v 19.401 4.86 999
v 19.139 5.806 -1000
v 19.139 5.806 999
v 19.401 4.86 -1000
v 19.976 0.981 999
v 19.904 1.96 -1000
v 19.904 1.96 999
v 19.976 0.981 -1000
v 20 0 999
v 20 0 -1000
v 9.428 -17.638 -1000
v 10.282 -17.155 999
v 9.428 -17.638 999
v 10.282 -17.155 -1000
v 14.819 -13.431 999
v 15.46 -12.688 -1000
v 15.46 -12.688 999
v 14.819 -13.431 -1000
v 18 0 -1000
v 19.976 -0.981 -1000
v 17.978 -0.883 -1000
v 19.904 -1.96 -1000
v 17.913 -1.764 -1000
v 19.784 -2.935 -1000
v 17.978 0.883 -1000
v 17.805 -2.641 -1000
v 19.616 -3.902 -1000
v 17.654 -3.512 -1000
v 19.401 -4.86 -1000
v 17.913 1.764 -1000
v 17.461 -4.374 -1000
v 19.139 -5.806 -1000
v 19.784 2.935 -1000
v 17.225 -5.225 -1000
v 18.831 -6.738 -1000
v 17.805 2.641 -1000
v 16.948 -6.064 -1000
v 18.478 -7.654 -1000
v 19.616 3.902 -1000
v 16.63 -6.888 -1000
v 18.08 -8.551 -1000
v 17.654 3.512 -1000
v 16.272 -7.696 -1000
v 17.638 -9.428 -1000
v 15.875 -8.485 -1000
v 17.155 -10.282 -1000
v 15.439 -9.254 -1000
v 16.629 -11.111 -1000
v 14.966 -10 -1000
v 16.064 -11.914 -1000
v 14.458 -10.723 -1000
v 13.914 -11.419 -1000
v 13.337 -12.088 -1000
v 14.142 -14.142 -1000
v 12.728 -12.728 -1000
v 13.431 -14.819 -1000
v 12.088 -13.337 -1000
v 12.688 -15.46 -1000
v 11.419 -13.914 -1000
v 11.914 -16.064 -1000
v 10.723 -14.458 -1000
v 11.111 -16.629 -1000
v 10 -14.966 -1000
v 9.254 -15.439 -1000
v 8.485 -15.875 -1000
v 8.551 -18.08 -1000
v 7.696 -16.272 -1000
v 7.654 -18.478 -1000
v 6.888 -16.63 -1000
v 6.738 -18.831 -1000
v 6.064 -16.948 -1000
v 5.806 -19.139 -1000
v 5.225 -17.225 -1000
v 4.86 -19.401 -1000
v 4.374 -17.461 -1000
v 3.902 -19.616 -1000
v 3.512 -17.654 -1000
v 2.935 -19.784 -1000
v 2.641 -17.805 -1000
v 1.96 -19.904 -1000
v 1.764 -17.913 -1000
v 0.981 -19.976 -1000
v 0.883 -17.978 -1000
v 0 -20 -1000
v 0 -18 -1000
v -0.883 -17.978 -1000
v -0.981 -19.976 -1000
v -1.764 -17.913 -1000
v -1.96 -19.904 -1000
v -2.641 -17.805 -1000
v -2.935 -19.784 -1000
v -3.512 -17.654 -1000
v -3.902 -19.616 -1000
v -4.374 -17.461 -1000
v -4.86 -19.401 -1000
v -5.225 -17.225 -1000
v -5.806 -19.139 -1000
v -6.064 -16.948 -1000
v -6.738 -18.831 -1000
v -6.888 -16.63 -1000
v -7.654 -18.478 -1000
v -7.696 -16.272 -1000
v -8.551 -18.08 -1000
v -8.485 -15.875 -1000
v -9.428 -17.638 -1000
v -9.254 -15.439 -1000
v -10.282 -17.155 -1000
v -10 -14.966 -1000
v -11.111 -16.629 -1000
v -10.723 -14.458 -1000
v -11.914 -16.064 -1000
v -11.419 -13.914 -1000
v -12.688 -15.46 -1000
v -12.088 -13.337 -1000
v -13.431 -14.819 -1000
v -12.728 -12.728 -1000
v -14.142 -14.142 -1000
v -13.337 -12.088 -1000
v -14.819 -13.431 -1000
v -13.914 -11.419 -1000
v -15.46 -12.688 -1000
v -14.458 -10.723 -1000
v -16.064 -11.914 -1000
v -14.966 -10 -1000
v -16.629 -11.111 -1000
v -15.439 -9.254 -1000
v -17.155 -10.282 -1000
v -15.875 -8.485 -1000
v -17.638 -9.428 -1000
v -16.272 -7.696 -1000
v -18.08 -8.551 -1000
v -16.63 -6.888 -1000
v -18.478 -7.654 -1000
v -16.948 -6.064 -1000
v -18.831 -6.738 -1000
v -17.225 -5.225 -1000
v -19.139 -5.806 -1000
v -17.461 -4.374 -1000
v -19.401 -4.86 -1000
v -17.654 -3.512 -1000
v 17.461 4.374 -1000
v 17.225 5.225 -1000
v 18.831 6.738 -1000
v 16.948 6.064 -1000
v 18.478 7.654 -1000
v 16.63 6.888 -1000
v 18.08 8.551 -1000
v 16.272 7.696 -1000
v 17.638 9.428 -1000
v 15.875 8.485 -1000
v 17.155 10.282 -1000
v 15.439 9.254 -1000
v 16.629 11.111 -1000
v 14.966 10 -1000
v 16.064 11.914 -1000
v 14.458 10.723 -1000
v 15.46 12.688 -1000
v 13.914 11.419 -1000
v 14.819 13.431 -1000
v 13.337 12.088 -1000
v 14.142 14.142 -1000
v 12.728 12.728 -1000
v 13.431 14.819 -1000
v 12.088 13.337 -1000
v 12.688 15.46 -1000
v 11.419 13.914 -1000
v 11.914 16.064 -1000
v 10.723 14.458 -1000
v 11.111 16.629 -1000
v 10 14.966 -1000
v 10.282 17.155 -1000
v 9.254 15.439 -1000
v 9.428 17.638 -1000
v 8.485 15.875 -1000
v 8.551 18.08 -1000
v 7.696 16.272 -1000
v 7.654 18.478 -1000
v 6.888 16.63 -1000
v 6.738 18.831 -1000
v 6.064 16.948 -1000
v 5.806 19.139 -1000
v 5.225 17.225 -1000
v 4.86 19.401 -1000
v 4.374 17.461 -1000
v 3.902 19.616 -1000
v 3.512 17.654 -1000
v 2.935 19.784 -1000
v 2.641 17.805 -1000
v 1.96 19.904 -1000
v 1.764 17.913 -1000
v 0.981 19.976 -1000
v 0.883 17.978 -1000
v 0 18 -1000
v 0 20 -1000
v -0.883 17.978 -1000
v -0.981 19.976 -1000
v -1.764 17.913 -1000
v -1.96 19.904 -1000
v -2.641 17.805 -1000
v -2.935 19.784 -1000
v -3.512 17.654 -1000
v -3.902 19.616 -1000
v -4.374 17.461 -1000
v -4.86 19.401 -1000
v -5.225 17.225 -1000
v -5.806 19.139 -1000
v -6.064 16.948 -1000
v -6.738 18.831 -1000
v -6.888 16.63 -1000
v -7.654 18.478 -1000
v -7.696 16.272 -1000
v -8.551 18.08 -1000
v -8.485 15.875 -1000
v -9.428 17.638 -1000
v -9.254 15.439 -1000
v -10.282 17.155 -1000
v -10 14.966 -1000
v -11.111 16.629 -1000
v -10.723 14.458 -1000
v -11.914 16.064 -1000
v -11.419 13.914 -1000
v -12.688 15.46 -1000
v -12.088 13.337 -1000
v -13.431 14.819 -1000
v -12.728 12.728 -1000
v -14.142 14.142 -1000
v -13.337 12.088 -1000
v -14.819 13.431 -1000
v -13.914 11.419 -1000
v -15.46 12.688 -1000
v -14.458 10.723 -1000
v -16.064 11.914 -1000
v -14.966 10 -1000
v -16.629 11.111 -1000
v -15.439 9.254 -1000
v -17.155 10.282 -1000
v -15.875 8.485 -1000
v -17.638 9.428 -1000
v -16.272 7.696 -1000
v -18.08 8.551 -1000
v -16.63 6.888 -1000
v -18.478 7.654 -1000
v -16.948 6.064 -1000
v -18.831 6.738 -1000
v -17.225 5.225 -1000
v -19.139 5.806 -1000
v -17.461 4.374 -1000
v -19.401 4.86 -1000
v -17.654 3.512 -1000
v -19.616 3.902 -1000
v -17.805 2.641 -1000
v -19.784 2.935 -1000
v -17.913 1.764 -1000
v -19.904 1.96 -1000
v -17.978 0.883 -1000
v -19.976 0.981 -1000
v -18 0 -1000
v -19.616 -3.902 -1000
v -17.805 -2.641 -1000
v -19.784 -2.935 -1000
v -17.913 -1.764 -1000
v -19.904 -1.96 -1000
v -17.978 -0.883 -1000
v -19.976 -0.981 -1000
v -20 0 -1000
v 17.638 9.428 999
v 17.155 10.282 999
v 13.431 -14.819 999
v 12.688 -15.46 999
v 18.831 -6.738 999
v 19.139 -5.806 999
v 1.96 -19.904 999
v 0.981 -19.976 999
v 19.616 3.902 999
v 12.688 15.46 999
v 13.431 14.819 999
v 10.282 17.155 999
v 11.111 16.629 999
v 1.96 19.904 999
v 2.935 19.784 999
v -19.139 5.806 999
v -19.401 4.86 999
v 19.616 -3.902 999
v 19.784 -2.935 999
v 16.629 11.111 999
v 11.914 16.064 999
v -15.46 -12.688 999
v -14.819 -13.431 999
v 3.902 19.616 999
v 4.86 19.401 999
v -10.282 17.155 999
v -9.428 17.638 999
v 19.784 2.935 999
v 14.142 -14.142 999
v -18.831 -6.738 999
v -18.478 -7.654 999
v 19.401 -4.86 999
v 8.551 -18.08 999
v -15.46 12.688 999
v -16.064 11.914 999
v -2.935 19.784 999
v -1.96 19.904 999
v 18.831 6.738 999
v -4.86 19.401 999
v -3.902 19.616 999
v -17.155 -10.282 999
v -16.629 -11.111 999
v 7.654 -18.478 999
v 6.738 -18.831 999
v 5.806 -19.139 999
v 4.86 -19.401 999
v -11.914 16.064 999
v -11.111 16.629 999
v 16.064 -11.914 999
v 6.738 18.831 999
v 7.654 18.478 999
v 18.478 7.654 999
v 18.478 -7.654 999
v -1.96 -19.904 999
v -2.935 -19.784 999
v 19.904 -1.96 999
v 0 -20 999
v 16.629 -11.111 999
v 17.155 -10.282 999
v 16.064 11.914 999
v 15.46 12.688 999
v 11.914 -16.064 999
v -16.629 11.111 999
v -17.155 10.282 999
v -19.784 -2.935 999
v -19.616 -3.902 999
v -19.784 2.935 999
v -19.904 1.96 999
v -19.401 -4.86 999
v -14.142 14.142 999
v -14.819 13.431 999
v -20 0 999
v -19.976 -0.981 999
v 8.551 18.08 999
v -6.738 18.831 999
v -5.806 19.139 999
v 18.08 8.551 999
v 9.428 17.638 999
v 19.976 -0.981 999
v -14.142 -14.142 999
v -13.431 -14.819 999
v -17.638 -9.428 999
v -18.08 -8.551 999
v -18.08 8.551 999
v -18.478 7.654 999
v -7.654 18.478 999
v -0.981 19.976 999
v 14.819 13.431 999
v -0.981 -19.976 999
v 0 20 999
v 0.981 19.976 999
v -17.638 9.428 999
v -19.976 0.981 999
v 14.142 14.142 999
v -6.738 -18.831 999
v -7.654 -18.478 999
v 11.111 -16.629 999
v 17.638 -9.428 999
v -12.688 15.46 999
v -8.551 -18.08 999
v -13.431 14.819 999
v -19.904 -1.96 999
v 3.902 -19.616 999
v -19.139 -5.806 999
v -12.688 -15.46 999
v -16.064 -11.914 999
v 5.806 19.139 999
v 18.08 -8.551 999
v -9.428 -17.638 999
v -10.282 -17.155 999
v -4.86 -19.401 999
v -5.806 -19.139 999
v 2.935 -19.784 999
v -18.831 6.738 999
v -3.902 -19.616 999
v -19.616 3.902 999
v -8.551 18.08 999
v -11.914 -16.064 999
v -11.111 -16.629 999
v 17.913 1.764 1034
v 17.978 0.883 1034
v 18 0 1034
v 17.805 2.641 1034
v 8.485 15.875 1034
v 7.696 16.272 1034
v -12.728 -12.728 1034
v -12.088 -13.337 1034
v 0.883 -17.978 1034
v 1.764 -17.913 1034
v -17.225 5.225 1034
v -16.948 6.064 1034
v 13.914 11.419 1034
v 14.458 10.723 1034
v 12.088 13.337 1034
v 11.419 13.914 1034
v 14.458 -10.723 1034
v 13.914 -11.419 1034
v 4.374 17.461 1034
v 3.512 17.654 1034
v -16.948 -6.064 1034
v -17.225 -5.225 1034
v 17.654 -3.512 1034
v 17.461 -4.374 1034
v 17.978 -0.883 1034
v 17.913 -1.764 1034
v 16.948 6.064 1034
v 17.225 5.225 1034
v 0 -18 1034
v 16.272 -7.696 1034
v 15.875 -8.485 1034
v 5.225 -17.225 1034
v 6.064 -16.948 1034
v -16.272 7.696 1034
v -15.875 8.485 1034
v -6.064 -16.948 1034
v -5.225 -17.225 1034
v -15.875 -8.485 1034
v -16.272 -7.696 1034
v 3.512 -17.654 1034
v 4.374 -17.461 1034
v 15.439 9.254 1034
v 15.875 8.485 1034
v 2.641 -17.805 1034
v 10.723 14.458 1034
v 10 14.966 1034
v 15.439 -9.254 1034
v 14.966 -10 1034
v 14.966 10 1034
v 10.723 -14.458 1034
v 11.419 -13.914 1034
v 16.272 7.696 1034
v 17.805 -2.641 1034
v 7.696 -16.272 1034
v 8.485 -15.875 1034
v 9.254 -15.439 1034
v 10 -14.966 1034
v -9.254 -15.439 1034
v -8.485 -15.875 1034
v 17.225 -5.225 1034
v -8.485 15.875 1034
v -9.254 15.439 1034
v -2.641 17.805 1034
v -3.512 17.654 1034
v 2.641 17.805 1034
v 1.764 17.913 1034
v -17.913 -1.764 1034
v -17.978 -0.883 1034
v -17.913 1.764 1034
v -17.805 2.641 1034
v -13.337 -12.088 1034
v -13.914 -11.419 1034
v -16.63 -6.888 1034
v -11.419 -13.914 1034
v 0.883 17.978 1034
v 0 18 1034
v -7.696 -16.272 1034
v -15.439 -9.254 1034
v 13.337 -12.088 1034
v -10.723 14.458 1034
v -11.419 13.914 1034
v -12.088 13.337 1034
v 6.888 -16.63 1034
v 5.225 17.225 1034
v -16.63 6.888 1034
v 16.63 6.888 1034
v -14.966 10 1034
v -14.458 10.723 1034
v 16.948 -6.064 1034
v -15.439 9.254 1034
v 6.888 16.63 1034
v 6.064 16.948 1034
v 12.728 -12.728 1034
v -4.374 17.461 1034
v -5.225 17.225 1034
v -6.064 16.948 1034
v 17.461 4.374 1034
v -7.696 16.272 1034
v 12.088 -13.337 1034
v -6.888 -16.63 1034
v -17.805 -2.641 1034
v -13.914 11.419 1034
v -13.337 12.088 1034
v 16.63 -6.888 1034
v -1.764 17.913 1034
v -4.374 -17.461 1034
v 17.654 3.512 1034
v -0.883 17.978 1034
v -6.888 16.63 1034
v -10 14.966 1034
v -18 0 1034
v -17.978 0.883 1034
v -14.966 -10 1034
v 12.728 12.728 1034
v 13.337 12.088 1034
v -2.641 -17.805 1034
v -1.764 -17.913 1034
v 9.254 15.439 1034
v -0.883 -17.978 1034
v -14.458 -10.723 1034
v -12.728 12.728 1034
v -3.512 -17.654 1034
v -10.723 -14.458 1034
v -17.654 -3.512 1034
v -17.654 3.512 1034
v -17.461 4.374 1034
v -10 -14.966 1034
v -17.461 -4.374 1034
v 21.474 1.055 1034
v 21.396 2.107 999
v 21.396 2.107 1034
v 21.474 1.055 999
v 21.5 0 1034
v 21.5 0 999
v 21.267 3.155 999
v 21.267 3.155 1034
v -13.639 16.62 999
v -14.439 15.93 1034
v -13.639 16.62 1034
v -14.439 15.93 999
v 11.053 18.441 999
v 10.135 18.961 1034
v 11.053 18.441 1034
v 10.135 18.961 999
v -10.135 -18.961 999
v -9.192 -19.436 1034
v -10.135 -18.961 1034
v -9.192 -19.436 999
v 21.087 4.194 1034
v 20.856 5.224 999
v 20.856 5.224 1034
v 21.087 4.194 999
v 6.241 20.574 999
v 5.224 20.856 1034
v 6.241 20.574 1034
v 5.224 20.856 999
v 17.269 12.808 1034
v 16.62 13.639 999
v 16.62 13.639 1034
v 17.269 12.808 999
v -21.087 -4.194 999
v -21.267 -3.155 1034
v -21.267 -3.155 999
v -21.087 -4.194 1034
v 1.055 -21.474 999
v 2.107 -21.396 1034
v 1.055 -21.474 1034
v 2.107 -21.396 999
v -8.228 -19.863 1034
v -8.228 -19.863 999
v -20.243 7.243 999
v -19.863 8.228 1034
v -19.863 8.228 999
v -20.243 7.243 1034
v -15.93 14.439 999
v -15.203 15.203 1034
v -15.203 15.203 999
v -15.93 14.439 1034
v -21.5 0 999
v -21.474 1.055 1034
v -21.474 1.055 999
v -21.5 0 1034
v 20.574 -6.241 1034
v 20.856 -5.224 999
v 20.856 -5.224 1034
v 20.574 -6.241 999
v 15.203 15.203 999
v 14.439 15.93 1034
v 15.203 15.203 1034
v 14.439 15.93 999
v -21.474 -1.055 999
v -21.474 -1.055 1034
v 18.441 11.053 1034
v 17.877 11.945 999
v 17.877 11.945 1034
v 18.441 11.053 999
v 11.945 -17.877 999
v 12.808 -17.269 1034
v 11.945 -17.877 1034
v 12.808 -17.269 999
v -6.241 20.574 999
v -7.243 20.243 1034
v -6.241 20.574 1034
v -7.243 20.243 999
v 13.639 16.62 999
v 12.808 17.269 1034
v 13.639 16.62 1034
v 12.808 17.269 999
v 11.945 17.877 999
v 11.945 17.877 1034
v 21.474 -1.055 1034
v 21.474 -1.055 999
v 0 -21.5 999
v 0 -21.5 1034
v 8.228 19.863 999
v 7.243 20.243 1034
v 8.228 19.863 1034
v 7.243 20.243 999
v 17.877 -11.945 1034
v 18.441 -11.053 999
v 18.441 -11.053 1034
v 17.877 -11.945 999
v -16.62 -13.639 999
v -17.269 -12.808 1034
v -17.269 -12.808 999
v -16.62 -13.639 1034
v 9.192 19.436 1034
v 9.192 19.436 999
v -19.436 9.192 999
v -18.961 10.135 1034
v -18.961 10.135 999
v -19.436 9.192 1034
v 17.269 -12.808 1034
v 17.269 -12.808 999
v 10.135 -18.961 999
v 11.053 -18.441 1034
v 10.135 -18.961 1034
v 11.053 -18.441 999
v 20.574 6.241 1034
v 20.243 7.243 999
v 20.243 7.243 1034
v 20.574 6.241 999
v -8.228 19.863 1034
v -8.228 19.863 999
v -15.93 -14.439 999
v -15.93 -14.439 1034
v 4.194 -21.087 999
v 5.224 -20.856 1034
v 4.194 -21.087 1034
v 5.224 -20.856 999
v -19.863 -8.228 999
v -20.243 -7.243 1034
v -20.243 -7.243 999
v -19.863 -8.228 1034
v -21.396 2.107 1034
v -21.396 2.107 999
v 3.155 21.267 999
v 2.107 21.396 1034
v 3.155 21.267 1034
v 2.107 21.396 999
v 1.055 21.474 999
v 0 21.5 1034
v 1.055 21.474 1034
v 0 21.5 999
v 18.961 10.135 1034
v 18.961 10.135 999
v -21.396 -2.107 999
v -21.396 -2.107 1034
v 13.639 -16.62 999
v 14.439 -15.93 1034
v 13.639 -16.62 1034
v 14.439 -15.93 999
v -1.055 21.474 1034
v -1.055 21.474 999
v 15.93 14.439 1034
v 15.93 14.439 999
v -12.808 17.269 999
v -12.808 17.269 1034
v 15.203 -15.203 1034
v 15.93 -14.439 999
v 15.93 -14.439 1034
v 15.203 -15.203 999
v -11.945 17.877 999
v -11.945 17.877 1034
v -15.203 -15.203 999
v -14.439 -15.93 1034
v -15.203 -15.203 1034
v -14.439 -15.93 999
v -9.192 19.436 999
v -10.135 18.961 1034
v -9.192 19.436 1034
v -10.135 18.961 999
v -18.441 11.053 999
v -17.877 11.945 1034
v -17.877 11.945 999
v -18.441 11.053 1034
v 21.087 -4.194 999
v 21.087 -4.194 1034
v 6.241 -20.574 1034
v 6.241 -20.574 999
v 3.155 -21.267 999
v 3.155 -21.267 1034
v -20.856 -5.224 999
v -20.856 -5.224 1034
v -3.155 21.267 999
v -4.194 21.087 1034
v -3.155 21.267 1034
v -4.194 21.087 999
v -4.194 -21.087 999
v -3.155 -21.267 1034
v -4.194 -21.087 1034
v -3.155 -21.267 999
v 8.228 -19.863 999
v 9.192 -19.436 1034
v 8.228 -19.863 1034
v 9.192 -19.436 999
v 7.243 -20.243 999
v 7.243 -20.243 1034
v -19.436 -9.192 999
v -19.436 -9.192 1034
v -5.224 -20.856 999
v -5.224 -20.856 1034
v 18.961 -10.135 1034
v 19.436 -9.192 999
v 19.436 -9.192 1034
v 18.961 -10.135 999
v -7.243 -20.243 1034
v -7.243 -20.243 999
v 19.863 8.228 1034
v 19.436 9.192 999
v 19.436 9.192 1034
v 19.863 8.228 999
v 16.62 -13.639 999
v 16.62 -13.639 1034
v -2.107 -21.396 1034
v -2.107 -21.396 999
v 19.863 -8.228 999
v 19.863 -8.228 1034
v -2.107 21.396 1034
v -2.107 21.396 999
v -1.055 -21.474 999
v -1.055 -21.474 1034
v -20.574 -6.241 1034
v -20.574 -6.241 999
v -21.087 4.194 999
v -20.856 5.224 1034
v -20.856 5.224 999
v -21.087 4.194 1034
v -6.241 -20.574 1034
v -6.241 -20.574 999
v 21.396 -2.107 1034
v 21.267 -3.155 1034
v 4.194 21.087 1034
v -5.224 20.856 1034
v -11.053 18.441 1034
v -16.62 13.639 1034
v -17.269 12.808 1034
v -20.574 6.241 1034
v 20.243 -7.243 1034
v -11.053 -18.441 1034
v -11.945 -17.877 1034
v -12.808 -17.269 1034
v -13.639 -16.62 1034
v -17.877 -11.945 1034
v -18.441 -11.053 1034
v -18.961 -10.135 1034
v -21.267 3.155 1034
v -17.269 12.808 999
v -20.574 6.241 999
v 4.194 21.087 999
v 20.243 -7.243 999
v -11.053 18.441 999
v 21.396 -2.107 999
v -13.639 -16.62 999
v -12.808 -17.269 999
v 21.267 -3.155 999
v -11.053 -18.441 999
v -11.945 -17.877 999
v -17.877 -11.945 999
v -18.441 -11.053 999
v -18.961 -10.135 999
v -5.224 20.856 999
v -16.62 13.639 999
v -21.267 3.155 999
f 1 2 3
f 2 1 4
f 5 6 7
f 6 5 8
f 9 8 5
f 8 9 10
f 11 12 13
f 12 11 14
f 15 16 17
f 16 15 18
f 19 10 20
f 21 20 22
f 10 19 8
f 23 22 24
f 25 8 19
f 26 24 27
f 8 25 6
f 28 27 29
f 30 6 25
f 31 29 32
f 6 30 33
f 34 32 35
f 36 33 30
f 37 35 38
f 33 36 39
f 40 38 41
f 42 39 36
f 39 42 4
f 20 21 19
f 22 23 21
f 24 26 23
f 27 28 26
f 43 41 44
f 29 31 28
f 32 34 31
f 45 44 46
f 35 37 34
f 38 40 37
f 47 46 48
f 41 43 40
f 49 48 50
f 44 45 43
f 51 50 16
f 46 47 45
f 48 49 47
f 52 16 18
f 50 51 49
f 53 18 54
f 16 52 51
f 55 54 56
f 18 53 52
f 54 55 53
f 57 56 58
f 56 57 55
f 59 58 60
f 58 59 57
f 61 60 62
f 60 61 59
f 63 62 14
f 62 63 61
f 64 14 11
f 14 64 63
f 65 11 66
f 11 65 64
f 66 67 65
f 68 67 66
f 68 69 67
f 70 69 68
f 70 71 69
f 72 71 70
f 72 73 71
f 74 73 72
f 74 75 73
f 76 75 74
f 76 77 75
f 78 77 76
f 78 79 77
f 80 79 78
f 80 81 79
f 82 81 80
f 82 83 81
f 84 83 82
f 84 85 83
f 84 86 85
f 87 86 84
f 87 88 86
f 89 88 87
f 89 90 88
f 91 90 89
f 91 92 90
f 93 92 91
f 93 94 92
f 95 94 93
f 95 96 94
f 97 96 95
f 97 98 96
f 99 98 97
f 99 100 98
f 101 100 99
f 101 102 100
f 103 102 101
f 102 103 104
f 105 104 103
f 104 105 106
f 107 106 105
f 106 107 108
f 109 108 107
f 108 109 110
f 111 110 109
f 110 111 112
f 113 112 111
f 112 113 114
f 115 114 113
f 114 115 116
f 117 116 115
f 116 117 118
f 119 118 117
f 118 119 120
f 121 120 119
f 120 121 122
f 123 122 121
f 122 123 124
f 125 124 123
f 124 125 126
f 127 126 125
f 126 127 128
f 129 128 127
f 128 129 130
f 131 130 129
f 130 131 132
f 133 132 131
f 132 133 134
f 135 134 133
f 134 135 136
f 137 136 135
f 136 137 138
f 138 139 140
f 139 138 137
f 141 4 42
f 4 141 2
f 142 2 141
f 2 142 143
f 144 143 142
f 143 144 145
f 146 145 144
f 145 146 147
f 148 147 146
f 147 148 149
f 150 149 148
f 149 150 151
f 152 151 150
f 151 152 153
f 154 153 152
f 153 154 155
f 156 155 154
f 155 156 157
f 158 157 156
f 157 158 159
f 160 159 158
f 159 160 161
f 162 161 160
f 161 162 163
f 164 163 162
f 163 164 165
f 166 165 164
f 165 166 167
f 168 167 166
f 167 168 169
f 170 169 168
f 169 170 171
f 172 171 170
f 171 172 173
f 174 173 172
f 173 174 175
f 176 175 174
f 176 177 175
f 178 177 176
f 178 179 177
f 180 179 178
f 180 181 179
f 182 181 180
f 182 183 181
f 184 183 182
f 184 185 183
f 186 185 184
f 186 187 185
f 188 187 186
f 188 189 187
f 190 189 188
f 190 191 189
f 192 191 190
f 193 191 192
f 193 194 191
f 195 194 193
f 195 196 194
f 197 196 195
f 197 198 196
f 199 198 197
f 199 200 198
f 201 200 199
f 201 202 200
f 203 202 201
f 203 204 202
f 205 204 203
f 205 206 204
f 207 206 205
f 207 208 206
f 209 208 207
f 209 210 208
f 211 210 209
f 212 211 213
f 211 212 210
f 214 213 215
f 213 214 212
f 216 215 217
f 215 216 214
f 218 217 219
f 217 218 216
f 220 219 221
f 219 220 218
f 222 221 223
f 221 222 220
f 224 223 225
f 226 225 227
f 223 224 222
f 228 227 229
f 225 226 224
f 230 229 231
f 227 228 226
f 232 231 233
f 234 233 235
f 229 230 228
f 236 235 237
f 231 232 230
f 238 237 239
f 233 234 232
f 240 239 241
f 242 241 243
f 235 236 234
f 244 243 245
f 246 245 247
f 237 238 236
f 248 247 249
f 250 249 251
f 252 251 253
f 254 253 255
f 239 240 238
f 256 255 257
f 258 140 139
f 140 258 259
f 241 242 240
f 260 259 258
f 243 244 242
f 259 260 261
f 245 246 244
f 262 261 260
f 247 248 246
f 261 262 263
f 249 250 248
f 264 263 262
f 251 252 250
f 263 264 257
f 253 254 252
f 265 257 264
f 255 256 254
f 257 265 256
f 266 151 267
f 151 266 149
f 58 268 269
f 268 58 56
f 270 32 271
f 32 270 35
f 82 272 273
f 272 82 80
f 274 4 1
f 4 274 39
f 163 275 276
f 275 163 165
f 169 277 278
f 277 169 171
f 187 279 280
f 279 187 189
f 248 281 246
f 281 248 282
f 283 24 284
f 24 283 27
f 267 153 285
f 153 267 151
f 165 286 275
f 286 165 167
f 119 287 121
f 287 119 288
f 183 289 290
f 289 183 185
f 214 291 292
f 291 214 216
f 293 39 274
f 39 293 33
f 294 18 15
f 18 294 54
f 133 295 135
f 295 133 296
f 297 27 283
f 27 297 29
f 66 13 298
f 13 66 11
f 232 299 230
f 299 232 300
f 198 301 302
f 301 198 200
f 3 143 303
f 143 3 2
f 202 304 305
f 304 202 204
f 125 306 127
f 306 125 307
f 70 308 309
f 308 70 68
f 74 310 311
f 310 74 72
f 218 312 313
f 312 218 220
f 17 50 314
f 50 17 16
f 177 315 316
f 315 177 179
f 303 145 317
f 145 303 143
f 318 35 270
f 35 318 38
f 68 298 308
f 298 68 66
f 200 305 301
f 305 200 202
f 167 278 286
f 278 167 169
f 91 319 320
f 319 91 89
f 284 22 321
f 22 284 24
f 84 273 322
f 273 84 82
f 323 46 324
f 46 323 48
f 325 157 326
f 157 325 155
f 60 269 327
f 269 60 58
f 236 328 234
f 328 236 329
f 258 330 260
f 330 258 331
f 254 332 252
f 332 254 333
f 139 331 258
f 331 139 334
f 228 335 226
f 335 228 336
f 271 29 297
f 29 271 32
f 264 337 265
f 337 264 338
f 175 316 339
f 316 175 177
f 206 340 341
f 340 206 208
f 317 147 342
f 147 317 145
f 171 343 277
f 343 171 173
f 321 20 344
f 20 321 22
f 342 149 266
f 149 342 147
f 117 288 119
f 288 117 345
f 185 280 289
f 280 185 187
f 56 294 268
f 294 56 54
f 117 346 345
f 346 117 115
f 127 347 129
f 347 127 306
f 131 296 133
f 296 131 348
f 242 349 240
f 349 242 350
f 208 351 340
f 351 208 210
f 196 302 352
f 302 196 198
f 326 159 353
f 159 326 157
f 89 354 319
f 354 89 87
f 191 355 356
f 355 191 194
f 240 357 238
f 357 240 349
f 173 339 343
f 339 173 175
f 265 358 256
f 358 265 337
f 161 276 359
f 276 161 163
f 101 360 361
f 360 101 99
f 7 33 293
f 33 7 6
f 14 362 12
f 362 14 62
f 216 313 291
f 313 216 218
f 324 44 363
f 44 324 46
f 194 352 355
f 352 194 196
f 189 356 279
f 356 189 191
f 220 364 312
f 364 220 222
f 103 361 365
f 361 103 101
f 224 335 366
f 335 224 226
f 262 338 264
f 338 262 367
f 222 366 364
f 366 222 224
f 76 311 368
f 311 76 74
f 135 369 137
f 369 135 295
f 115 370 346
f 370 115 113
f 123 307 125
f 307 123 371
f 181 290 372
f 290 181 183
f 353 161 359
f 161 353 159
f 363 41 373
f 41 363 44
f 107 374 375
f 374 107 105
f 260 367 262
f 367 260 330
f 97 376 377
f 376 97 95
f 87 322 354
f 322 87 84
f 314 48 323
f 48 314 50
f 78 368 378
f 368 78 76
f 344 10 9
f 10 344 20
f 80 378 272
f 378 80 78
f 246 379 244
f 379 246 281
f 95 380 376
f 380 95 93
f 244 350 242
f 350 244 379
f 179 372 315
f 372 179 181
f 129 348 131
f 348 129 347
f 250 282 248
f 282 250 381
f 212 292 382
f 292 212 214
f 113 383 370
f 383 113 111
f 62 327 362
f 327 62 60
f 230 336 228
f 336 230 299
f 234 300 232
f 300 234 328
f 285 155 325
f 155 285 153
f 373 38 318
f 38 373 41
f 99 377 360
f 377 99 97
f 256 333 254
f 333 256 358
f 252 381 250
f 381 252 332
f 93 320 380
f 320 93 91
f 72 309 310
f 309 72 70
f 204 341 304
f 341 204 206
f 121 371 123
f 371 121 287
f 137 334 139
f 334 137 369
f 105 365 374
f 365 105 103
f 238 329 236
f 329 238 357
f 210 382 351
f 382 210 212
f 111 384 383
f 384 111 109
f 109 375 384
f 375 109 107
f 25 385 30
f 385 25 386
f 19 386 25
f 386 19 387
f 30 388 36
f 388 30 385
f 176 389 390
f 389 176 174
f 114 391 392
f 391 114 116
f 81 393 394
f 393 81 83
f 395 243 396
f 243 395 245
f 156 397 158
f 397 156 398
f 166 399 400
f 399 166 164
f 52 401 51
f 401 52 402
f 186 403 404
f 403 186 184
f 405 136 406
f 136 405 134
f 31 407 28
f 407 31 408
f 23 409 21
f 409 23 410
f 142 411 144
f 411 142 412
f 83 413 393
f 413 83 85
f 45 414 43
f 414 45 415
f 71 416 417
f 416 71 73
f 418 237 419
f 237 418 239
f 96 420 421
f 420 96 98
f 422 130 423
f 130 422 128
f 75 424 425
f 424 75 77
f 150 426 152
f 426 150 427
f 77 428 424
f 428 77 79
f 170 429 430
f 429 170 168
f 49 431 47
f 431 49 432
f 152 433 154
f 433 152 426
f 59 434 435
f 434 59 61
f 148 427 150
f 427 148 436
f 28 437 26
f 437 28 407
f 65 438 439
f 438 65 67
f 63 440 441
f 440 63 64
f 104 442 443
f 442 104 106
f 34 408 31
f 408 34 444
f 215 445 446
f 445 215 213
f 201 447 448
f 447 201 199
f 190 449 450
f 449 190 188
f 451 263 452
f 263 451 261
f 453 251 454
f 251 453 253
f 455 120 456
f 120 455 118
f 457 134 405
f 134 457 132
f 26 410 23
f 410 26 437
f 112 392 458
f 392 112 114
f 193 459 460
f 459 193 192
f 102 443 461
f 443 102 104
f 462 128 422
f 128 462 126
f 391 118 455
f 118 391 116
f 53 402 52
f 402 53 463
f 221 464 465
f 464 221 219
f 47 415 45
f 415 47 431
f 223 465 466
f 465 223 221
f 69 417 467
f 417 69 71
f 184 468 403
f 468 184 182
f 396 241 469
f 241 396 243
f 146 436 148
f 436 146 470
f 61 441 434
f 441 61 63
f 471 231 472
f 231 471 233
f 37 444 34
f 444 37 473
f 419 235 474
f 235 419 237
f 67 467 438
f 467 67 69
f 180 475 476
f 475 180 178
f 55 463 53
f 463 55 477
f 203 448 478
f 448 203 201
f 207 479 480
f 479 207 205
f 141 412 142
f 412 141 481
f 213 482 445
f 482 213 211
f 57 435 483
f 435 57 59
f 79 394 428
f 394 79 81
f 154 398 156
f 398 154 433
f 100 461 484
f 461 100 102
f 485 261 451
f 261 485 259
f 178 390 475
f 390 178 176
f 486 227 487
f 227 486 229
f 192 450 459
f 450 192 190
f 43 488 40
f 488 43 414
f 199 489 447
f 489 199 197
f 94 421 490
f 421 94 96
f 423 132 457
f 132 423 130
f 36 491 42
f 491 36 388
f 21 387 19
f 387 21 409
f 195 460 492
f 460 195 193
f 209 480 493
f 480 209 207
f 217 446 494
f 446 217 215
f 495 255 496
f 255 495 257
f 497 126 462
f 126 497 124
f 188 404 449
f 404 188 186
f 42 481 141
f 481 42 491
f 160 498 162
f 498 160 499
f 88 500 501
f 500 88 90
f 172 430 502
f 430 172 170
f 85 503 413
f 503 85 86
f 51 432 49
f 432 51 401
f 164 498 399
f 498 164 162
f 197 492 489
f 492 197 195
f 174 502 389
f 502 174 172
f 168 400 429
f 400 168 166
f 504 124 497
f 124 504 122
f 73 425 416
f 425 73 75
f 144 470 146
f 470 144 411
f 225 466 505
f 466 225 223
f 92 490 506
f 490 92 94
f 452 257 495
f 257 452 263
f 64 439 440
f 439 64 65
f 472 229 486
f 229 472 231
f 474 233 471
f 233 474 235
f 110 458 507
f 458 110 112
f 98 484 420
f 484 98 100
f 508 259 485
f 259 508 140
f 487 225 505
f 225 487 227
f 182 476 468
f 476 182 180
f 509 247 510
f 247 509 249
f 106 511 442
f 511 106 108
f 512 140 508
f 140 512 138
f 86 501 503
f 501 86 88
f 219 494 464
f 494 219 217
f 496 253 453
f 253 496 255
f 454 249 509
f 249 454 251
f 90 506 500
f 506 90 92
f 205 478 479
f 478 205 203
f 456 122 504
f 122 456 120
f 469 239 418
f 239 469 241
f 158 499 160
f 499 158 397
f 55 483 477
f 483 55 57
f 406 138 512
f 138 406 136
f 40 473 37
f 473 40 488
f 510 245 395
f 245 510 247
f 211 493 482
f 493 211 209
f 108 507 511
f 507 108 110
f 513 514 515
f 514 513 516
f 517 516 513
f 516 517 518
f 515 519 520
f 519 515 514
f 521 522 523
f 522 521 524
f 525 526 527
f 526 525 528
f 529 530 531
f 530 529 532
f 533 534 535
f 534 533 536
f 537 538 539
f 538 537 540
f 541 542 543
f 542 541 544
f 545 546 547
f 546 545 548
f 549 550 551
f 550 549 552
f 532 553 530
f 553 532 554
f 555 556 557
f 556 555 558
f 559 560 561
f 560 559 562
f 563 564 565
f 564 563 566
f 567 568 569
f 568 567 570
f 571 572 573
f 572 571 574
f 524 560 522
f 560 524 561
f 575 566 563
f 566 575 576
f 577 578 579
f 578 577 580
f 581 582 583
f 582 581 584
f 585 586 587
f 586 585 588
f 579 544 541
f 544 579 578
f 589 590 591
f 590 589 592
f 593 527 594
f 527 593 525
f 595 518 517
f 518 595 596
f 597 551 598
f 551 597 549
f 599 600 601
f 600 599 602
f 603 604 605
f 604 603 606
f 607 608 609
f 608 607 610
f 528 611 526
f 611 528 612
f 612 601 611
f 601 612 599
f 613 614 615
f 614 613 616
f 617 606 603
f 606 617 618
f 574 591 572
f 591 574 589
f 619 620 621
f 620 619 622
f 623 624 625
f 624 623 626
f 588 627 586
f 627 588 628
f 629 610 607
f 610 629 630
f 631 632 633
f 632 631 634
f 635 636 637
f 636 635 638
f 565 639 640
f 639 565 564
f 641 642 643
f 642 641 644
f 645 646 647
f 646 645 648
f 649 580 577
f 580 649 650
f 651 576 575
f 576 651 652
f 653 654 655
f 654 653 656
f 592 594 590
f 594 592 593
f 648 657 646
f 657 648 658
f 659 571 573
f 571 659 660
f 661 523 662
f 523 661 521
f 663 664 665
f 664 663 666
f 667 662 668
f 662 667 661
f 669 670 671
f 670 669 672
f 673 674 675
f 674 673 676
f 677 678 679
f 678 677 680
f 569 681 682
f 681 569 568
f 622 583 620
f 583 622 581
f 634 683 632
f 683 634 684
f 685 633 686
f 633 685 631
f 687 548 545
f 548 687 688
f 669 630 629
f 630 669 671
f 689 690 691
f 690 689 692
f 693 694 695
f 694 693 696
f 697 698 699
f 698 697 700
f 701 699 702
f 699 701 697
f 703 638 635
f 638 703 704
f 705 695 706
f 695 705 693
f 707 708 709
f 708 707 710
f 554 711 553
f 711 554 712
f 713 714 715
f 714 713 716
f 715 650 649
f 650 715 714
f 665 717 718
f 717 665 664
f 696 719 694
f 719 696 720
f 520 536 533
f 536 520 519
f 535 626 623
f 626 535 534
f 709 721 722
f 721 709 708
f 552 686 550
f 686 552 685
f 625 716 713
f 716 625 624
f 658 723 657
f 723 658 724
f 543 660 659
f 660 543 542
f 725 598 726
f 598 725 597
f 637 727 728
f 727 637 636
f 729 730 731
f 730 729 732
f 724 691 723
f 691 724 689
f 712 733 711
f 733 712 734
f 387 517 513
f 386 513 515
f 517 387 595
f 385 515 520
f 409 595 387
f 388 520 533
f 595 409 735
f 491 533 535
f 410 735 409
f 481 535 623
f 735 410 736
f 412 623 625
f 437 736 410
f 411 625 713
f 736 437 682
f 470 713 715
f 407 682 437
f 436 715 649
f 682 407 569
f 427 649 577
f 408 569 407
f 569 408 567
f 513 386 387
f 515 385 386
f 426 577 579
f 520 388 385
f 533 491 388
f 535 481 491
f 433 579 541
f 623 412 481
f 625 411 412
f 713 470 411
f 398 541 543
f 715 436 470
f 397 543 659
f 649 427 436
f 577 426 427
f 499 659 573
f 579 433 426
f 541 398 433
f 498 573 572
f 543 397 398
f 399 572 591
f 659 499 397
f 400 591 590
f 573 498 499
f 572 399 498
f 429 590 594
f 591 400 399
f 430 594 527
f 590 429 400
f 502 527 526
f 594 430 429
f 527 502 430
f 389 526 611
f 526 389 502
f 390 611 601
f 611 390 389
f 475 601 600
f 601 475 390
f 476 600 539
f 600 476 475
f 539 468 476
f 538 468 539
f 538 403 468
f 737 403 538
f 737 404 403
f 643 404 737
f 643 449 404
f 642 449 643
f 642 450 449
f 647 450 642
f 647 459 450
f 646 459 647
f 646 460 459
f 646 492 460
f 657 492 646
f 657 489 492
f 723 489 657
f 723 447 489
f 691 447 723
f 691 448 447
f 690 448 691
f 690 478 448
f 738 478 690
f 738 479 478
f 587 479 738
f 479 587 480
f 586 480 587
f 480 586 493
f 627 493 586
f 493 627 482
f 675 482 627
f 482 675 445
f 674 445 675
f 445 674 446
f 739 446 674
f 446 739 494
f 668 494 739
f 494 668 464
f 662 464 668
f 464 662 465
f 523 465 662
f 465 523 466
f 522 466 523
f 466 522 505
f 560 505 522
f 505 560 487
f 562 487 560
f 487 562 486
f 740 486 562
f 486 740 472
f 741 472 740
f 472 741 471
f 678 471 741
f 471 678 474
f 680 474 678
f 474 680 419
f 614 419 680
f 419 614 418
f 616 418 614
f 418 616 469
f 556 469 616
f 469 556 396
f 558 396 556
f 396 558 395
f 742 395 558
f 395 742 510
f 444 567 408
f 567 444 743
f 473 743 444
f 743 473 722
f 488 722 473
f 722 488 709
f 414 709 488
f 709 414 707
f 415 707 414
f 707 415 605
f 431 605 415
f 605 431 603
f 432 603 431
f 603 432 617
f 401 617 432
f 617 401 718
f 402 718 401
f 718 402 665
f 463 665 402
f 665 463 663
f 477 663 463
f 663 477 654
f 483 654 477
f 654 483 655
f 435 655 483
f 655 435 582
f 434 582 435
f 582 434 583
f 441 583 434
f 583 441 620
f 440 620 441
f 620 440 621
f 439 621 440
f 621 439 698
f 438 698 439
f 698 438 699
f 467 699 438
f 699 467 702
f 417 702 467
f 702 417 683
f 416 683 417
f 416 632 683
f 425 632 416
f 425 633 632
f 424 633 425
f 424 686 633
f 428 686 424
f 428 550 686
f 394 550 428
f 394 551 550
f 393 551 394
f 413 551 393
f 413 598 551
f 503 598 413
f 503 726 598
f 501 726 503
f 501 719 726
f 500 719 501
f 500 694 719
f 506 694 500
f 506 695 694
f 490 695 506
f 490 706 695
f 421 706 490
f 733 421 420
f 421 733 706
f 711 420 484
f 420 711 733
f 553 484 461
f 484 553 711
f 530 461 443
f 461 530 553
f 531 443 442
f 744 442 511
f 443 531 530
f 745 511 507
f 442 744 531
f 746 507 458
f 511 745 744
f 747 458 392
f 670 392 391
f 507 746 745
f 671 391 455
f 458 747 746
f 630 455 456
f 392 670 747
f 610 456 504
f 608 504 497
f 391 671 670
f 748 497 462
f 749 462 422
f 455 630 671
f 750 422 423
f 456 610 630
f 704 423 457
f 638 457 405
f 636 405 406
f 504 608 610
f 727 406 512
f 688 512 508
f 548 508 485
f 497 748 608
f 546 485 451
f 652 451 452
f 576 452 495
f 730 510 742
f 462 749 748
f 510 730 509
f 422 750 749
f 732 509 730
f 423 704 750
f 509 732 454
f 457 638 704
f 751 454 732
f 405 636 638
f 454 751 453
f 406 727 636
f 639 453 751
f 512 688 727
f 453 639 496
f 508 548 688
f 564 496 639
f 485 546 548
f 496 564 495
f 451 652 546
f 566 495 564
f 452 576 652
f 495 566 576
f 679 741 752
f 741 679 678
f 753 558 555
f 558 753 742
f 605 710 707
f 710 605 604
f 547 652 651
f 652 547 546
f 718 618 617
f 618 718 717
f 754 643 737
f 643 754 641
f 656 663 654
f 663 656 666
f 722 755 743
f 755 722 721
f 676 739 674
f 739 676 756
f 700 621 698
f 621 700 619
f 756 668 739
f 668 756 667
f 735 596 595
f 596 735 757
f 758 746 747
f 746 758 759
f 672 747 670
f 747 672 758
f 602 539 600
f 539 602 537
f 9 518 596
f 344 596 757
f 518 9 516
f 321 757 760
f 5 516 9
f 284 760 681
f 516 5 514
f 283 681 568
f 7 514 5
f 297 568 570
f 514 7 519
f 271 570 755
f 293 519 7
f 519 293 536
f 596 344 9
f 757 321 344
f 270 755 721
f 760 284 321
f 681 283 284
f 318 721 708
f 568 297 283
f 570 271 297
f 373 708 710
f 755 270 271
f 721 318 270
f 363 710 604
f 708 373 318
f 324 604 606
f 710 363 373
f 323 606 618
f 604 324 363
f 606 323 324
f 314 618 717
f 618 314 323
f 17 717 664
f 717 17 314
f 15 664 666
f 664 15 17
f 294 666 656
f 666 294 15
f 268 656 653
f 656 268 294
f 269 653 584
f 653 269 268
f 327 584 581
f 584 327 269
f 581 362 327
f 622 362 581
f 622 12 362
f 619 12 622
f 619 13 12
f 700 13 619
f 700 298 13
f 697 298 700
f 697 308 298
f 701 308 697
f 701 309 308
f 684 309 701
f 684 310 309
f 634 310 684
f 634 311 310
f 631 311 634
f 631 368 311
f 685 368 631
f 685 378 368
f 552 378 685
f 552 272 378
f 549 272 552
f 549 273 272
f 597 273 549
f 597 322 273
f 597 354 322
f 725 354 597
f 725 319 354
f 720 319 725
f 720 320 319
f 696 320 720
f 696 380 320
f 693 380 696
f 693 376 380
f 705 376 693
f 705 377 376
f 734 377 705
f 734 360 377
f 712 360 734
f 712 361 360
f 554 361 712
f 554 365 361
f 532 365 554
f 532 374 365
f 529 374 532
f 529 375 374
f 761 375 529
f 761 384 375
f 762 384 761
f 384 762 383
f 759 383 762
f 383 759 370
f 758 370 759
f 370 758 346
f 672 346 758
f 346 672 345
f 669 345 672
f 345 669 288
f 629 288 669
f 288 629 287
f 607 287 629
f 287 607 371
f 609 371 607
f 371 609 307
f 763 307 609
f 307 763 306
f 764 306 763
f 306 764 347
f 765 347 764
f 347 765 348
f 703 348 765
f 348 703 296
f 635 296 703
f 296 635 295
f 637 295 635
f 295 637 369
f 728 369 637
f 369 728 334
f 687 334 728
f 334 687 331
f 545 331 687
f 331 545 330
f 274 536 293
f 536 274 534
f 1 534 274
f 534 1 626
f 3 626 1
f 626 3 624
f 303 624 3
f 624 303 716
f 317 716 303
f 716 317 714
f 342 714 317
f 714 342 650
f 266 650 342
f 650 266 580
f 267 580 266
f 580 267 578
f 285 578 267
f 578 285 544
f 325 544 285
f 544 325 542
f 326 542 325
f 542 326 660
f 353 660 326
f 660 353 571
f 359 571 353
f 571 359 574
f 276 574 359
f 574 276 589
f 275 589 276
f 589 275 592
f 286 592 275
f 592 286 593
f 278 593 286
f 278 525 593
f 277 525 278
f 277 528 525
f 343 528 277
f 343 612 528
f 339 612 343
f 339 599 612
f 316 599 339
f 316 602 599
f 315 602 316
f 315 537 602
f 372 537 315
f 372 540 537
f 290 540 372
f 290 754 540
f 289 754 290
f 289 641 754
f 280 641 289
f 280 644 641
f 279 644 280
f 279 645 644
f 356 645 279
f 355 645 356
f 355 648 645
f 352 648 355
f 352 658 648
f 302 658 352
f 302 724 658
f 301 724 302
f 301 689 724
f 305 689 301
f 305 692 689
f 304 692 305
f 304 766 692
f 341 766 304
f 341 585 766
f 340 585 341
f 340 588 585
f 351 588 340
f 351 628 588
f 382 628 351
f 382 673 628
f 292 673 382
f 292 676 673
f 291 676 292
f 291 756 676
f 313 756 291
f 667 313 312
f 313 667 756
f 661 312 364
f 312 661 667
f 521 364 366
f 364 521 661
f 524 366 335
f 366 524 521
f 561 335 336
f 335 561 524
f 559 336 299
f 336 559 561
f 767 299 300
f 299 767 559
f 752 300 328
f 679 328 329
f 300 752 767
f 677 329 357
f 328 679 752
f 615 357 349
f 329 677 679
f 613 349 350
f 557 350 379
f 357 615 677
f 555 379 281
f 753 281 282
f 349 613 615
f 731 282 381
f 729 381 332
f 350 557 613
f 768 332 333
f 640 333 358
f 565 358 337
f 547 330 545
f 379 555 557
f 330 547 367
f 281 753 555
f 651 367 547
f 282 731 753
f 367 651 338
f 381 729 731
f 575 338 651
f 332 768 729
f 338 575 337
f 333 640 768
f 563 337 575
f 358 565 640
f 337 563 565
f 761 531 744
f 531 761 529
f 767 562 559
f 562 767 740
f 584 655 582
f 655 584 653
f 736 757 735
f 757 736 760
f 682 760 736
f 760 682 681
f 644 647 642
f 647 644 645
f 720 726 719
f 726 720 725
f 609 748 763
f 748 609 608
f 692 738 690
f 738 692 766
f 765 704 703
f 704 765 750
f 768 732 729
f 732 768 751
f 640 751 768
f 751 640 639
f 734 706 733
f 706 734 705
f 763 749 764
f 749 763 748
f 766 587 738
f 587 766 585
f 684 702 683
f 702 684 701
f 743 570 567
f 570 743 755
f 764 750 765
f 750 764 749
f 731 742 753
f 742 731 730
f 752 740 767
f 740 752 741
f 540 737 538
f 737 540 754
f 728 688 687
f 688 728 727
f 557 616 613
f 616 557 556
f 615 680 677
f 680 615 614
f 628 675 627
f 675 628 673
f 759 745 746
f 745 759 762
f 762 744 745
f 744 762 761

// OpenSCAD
$fn = 128;

// Parameters
nominal_diameter = 40; //[20:80:1]
length_mm = 2000; //[1000:4000:10]
pipe_wall_thickness = 2.0; //[1.0:4.0:0.1]
end_fitting_length = 35; //[15:70:1]
end_fitting_wall_extra = 1.5; //[0.5:4.0:0.1]
overlap = 1.0; //[0.5:2.0:0.1]

module ht_pipe() {
    od = nominal_diameter;
    r_outer = od/2;
    r_inner = max(0.01, r_outer - pipe_wall_thickness);

    r_socket_outer = r_outer + end_fitting_wall_extra;
    r_socket_inner = r_inner;

    // Build centered on Z for predictable viewing
    main_z0 = -length_mm/2;
    socket_z0 = length_mm/2 - overlap; // ensures connection with overlap

    color([0.85, 0.85, 0.8])
    union() {
        // Main pipe (hollow)
        translate([0, 0, main_z0])
        difference() {
            cylinder(r=r_outer, h=length_mm, center=false);
            translate([0, 0, -overlap])
                cylinder(r=r_inner, h=length_mm + 2*overlap, center=false);
        }

        // End socket/fitting at +Z end (connected)
        translate([0, 0, socket_z0])
        difference() {
            cylinder(r=r_socket_outer, h=end_fitting_length, center=false);
            translate([0, 0, -overlap])
                cylinder(r=r_socket_inner, h=end_fitting_length + 2*overlap, center=false);
        }
    }
}

ht_pipe();
